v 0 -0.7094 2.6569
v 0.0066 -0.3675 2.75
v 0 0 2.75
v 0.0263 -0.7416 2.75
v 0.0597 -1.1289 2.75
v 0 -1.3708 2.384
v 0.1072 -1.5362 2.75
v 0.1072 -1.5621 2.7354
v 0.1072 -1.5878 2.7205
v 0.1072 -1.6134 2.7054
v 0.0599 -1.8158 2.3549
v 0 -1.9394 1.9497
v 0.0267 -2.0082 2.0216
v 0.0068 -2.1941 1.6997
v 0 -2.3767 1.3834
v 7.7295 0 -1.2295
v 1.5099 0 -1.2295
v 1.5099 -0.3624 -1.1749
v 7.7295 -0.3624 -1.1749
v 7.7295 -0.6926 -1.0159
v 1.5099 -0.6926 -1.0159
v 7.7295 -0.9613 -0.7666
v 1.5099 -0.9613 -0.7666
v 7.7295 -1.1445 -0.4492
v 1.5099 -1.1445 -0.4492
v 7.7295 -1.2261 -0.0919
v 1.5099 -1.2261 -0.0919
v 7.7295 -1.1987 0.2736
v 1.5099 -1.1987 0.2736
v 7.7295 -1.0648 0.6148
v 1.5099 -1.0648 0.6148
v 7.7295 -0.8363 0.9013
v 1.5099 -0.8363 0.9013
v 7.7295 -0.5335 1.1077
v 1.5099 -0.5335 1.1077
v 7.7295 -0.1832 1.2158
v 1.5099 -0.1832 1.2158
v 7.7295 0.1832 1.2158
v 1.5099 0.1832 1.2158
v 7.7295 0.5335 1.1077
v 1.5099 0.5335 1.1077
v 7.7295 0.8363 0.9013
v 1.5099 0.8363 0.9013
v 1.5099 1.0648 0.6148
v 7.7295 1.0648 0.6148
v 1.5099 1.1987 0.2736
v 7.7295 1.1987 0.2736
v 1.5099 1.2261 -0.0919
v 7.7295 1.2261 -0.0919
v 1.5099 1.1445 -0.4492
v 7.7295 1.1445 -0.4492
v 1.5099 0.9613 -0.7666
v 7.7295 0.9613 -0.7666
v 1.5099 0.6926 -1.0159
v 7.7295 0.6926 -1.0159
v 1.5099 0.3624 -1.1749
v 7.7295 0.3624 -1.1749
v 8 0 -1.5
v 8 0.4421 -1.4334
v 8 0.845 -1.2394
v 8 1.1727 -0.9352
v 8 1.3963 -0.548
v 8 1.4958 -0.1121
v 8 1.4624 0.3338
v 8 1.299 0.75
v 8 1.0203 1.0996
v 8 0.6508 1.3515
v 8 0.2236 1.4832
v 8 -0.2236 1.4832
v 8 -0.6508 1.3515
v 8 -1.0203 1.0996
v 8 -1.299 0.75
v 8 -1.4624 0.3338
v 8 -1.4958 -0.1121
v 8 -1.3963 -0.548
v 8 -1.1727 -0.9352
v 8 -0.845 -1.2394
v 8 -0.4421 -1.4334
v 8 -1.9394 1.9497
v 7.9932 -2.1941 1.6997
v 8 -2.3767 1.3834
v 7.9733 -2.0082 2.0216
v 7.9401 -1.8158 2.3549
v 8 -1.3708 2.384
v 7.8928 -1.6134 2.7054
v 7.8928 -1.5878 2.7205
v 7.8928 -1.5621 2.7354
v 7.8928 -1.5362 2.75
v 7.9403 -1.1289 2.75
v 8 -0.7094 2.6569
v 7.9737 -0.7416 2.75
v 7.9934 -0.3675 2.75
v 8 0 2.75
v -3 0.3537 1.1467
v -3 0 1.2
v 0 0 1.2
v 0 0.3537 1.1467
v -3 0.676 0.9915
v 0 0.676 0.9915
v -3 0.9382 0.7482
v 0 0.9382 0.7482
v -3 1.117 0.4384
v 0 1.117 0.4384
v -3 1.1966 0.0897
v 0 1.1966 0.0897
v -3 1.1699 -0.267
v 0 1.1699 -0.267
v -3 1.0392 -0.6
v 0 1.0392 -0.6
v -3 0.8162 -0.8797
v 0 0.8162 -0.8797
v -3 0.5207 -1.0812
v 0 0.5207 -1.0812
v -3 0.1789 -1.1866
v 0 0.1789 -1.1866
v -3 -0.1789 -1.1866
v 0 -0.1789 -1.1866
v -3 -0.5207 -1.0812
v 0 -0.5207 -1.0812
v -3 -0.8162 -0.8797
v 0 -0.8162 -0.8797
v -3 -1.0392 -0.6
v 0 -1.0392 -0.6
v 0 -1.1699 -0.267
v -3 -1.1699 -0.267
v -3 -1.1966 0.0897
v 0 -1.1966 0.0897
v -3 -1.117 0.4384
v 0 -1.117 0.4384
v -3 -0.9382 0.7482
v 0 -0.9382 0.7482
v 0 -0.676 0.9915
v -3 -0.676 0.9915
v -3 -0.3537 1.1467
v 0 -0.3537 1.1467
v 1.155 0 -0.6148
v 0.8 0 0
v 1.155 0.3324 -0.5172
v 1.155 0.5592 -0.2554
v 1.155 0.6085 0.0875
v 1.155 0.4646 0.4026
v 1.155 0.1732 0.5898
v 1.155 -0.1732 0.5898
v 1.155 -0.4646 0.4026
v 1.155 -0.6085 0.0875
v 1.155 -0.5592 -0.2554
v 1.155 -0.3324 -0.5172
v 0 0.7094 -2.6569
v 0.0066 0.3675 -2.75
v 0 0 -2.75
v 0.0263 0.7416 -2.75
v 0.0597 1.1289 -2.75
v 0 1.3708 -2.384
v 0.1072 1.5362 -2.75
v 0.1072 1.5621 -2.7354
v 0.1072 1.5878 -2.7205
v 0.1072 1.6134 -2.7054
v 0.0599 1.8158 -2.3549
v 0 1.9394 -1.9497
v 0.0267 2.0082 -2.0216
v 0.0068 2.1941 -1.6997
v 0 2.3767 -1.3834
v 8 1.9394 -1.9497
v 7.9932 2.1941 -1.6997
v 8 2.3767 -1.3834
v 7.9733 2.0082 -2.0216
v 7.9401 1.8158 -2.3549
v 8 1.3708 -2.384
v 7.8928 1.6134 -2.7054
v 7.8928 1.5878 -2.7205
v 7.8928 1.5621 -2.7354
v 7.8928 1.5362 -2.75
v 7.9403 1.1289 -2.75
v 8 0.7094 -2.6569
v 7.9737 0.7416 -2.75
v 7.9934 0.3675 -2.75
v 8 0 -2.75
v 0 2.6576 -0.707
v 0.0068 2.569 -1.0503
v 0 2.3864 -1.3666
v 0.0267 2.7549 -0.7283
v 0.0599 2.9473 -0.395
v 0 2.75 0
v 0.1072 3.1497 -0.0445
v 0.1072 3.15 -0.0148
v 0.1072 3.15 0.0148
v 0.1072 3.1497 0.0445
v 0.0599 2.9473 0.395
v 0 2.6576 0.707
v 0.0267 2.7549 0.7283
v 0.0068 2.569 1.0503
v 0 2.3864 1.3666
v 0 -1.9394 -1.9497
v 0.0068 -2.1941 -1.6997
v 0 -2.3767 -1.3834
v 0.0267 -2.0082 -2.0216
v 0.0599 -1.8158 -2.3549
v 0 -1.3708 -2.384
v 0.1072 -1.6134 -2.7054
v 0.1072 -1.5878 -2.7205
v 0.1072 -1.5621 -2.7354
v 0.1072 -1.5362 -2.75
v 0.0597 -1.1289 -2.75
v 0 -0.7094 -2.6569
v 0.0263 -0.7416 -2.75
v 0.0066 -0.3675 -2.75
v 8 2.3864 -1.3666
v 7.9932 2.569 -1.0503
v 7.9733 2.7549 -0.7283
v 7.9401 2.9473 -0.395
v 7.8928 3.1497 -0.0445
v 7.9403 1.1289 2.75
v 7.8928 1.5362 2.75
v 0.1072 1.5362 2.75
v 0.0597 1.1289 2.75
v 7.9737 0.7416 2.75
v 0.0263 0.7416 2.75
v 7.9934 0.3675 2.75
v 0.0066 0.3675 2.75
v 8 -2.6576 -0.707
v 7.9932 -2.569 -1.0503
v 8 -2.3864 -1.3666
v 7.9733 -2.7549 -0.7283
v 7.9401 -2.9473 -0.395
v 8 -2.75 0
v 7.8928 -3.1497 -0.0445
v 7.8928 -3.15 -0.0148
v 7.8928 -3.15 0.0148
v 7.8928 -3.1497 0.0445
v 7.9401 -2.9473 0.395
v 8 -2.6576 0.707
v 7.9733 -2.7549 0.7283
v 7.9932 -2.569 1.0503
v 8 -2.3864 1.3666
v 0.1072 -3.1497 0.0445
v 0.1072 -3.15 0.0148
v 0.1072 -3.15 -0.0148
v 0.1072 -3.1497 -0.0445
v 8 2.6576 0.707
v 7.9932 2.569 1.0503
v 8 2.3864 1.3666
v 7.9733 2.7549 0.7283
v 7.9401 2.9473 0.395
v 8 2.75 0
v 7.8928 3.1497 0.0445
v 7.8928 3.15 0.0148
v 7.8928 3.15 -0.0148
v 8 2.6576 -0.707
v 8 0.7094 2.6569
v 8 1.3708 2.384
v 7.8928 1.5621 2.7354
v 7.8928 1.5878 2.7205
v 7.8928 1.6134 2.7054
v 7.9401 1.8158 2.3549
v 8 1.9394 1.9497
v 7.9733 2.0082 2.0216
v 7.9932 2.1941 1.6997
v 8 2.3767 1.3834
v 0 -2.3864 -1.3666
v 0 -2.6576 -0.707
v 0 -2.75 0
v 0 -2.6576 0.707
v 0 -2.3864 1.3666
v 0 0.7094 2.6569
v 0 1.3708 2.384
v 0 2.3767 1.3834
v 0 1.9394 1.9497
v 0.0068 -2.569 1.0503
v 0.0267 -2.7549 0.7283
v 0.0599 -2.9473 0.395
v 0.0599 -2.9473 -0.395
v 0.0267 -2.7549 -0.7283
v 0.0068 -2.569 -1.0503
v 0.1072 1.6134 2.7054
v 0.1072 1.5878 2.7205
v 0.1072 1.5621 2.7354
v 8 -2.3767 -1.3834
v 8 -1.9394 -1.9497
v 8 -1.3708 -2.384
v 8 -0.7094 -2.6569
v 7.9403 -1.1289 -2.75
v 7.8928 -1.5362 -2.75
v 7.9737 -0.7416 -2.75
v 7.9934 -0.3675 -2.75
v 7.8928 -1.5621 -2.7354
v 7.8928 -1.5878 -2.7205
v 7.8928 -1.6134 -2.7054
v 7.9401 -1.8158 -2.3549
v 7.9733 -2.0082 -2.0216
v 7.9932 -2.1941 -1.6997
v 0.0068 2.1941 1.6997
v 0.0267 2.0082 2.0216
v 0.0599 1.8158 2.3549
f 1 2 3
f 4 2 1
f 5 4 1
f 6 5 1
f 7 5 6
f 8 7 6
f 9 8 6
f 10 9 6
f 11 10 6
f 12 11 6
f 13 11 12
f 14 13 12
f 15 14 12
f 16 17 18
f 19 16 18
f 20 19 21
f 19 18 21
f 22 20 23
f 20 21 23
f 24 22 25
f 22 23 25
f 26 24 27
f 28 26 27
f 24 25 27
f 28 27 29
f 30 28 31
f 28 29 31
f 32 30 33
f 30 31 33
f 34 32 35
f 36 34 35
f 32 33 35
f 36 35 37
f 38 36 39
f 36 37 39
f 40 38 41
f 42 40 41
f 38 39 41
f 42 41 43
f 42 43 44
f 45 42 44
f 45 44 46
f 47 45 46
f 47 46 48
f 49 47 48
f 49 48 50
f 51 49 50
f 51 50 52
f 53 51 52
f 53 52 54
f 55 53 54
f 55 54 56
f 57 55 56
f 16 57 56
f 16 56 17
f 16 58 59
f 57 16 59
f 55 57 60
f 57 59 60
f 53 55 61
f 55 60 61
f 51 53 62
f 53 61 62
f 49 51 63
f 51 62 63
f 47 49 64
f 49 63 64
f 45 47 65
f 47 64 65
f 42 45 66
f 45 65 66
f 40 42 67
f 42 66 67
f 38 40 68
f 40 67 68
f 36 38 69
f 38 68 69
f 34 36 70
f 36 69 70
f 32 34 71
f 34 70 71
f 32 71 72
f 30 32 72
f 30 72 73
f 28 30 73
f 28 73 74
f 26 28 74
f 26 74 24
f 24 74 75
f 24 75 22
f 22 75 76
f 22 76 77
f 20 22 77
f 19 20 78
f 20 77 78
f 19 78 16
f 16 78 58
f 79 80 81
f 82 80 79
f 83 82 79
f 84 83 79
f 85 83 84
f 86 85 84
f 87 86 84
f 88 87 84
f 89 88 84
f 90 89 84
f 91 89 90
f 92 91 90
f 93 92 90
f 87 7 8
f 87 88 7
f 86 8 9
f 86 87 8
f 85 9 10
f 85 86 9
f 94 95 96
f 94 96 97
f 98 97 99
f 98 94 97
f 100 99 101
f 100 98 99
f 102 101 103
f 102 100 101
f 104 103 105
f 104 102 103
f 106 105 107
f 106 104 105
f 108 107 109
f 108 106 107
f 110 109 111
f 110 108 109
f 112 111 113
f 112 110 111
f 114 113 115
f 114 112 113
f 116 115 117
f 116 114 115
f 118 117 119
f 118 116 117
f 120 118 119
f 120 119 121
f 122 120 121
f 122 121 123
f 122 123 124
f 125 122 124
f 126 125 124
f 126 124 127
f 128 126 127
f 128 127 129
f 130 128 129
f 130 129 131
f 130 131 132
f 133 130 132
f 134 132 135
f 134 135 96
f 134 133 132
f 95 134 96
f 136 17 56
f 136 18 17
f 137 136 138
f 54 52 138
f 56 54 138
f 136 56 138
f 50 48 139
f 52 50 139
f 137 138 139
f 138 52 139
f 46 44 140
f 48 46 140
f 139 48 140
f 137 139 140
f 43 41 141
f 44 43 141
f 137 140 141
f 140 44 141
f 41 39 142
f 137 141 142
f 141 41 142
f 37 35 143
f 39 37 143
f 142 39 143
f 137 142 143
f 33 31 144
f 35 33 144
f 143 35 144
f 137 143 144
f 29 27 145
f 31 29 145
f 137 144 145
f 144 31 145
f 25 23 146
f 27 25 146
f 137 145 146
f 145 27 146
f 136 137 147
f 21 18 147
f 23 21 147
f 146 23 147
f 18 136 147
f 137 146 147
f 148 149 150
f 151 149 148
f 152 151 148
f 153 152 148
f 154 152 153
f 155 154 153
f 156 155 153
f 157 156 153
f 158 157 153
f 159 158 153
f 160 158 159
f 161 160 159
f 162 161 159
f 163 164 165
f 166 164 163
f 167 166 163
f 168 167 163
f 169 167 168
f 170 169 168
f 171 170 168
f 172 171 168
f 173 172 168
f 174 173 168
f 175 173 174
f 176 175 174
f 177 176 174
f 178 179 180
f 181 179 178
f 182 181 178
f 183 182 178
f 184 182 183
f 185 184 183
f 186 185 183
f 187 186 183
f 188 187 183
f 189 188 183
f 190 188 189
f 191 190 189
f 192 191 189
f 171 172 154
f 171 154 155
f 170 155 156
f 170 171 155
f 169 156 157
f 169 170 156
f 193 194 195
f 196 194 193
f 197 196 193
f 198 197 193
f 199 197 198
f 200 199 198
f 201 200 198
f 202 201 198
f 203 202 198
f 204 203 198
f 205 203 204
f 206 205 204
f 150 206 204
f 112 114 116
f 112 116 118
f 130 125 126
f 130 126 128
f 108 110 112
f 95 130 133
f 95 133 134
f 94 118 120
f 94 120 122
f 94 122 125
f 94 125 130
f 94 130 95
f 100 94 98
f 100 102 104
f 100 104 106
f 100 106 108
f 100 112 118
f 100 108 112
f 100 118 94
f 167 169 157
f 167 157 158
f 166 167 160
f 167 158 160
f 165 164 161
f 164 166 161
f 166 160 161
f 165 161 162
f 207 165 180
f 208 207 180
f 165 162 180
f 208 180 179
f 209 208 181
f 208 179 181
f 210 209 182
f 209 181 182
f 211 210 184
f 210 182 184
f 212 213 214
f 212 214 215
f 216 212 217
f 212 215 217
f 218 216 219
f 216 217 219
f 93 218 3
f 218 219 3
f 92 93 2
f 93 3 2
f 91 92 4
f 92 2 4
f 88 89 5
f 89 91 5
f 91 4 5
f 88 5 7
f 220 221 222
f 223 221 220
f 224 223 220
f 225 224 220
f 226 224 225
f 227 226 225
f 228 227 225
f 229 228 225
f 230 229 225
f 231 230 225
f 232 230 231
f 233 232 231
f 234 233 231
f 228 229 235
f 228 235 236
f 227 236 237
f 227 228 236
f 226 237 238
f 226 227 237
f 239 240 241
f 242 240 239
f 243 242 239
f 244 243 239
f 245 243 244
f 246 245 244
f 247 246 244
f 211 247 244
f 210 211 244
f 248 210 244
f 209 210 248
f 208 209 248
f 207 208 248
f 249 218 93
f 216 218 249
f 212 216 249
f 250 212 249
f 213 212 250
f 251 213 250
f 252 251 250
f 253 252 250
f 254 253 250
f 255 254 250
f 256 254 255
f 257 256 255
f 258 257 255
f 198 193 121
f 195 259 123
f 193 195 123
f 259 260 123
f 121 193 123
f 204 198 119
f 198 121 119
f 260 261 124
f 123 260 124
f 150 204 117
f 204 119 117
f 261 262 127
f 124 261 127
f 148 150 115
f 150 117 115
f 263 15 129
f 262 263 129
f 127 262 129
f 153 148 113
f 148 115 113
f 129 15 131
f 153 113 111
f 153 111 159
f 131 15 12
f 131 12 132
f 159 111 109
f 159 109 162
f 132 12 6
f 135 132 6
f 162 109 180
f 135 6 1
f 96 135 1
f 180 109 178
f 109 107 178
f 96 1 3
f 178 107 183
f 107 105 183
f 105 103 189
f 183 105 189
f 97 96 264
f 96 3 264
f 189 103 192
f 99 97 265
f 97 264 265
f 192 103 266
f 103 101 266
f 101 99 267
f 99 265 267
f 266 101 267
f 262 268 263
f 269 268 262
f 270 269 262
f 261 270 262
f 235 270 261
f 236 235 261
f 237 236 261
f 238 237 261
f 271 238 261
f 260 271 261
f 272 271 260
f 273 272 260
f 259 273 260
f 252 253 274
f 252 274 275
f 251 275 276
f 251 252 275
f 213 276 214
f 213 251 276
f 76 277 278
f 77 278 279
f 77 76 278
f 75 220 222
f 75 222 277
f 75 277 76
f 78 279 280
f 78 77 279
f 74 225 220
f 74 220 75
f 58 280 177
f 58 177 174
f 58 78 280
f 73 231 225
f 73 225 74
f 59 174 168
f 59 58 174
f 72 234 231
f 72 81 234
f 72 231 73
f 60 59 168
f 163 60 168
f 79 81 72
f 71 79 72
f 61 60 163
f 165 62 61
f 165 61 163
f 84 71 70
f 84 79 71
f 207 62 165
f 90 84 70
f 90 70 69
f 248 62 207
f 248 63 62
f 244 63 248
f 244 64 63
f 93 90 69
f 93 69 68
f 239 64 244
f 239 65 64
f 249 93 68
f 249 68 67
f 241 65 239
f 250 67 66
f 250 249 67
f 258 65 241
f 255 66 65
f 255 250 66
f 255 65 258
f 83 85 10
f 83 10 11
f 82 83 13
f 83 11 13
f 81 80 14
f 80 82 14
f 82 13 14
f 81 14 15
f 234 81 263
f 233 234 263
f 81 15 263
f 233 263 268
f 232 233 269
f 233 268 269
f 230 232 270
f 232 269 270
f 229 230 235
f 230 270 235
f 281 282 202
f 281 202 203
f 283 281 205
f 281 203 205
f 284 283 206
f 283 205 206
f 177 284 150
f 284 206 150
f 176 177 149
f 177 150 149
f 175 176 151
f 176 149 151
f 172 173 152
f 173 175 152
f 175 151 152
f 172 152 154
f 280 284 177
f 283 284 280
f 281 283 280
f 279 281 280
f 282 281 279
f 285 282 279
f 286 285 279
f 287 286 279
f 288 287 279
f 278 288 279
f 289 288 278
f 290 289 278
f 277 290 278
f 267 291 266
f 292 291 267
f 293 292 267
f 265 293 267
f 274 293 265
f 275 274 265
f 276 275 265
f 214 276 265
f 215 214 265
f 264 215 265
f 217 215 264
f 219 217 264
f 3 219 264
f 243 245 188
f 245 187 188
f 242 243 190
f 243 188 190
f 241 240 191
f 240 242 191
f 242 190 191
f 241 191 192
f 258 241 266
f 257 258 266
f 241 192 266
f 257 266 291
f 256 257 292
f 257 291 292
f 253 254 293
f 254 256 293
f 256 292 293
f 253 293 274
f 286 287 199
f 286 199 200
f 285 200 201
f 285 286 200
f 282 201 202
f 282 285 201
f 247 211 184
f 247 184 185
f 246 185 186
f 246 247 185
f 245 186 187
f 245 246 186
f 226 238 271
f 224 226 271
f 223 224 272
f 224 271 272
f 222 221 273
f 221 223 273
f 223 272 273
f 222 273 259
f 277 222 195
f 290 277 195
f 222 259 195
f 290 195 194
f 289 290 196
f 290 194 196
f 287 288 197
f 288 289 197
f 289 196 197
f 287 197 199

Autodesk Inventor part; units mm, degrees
ref_plane "YZ Plane" through (0, 0, 0) normal (1, 0, 0) x (0, 1, 0)
ref_plane "XZ Plane" through (0, 0, 0) normal (0, 1, 0) x (-1, 0, 0)
ref_plane "XY Plane" through (0, 0, 0) normal (0, 0, 1) x (1, 0, 0)
sketch "Sketch_1" plane through (0, 0, 0) normal (0, 0, 1) x (1, 0, 0)
  line L0 (8, 0) -> (0, 0)
  line L1 (0, 0) -> (0, 2.75)
  line L2 (0, 2.75) -> (0.1072, 3.15)
  line L3 (0.1072, 3.15) -> (7.8928, 3.15)
  line L4 (7.8928, 3.15) -> (8, 2.75)
  line L5 (8, 2.75) -> (8, 0)
  line L6 (8, 0) -> (0, 0)
revolve "Revolution1" add sketch "Sketch_1" angle 360 about axis through (8, 0, 0) along (1, 0, 0)
sketch "Sketch_5" plane through (0, 0, 0) normal (0, 0, 1) x (1, 0, 0)
  line L0 (0, 0) -> (-6, 0)
  line L1 (-6, 0) -> (-6, 1.1935)
  line L2 (-6, 1.1935) -> (-5.6935, 1.5)
  line L3 (-5.6935, 1.5) -> (-0.6, 1.5)
  line L4 (-0.6, 1.5) -> (-0.6, 1.2295)
  line L5 (-0.6, 1.2295) -> (0, 1.2295)
  line L6 (0, 1.2295) -> (0, 0)
  line L7 (0, 0) -> (-6, 0)
revolve "Revolution2" add sketch "Sketch_5" angle 360 about axis through (0, 0, 0) along (1, 0, 0)
thread "Thread1" size "M3x0.5" class "6g" standard "ISO Metric profile" full length
sketch "Sketch_6" plane through (0, 0, 0) normal (1, 0, 0) x (0, 1, 0)
  circle A0 centre (0, 0) radius 6.3
  line L0 (1.5877, 2.75) -> (-1.5877, 2.75)
  line L1 (-1.5877, 2.75) -> (-3.1754, 0)
  line L2 (-3.1754, 0) -> (-1.5877, -2.75)
  line L3 (-1.5877, -2.75) -> (1.5877, -2.75)
  line L4 (1.5877, -2.75) -> (3.1754, 0)
  line L5 (3.1754, 0) -> (1.5877, 2.75)
extrude "Extrusion1" cut sketch "Sketch_6" along normal blind 8
sketch "Sketch4" plane through (8, 0, 0) normal (1, 0, 0) x (0, 0, -1)
  point P0 (0, 0)
hole "Hole1" at (8, 0, 0) direction (-1, 0, 0) diameter 2.459 depth 6.4901 tip angle 120 countersink diameter 3 countersink angle 90 thread size "M3x0.5" class "6H" standard "ISO Metric profile"
sketch "スケッチ5" plane through (-6, 0, 0) normal (-1, 0, 0) x (0, 0, 1)
  circle A0 centre (0, 0) radius 1.1935 projected
  circle A1 centre (0, 0) radius 1.2
  circle A2 centre (0, 0) radius 2.2848
  dimension "d13" = 2.4
extrude "押し出し2" cut sketch "スケッチ5" against normal blind 6 contours A2
sketch "スケッチ6" plane through (-6, 0, 0) normal (-1, 0, 0) x (0, 0, 1)
  circle A0 centre (0, 0) radius 1.1935 projected
  circle A1 centre (0, 0) radius 1.9337
extrude "押し出し3" cut sketch "スケッチ6" against normal blind 3 contours A0 | A1
properties part number "SLCG5.5-8" material "ステンレス鋼 AISI 302"
